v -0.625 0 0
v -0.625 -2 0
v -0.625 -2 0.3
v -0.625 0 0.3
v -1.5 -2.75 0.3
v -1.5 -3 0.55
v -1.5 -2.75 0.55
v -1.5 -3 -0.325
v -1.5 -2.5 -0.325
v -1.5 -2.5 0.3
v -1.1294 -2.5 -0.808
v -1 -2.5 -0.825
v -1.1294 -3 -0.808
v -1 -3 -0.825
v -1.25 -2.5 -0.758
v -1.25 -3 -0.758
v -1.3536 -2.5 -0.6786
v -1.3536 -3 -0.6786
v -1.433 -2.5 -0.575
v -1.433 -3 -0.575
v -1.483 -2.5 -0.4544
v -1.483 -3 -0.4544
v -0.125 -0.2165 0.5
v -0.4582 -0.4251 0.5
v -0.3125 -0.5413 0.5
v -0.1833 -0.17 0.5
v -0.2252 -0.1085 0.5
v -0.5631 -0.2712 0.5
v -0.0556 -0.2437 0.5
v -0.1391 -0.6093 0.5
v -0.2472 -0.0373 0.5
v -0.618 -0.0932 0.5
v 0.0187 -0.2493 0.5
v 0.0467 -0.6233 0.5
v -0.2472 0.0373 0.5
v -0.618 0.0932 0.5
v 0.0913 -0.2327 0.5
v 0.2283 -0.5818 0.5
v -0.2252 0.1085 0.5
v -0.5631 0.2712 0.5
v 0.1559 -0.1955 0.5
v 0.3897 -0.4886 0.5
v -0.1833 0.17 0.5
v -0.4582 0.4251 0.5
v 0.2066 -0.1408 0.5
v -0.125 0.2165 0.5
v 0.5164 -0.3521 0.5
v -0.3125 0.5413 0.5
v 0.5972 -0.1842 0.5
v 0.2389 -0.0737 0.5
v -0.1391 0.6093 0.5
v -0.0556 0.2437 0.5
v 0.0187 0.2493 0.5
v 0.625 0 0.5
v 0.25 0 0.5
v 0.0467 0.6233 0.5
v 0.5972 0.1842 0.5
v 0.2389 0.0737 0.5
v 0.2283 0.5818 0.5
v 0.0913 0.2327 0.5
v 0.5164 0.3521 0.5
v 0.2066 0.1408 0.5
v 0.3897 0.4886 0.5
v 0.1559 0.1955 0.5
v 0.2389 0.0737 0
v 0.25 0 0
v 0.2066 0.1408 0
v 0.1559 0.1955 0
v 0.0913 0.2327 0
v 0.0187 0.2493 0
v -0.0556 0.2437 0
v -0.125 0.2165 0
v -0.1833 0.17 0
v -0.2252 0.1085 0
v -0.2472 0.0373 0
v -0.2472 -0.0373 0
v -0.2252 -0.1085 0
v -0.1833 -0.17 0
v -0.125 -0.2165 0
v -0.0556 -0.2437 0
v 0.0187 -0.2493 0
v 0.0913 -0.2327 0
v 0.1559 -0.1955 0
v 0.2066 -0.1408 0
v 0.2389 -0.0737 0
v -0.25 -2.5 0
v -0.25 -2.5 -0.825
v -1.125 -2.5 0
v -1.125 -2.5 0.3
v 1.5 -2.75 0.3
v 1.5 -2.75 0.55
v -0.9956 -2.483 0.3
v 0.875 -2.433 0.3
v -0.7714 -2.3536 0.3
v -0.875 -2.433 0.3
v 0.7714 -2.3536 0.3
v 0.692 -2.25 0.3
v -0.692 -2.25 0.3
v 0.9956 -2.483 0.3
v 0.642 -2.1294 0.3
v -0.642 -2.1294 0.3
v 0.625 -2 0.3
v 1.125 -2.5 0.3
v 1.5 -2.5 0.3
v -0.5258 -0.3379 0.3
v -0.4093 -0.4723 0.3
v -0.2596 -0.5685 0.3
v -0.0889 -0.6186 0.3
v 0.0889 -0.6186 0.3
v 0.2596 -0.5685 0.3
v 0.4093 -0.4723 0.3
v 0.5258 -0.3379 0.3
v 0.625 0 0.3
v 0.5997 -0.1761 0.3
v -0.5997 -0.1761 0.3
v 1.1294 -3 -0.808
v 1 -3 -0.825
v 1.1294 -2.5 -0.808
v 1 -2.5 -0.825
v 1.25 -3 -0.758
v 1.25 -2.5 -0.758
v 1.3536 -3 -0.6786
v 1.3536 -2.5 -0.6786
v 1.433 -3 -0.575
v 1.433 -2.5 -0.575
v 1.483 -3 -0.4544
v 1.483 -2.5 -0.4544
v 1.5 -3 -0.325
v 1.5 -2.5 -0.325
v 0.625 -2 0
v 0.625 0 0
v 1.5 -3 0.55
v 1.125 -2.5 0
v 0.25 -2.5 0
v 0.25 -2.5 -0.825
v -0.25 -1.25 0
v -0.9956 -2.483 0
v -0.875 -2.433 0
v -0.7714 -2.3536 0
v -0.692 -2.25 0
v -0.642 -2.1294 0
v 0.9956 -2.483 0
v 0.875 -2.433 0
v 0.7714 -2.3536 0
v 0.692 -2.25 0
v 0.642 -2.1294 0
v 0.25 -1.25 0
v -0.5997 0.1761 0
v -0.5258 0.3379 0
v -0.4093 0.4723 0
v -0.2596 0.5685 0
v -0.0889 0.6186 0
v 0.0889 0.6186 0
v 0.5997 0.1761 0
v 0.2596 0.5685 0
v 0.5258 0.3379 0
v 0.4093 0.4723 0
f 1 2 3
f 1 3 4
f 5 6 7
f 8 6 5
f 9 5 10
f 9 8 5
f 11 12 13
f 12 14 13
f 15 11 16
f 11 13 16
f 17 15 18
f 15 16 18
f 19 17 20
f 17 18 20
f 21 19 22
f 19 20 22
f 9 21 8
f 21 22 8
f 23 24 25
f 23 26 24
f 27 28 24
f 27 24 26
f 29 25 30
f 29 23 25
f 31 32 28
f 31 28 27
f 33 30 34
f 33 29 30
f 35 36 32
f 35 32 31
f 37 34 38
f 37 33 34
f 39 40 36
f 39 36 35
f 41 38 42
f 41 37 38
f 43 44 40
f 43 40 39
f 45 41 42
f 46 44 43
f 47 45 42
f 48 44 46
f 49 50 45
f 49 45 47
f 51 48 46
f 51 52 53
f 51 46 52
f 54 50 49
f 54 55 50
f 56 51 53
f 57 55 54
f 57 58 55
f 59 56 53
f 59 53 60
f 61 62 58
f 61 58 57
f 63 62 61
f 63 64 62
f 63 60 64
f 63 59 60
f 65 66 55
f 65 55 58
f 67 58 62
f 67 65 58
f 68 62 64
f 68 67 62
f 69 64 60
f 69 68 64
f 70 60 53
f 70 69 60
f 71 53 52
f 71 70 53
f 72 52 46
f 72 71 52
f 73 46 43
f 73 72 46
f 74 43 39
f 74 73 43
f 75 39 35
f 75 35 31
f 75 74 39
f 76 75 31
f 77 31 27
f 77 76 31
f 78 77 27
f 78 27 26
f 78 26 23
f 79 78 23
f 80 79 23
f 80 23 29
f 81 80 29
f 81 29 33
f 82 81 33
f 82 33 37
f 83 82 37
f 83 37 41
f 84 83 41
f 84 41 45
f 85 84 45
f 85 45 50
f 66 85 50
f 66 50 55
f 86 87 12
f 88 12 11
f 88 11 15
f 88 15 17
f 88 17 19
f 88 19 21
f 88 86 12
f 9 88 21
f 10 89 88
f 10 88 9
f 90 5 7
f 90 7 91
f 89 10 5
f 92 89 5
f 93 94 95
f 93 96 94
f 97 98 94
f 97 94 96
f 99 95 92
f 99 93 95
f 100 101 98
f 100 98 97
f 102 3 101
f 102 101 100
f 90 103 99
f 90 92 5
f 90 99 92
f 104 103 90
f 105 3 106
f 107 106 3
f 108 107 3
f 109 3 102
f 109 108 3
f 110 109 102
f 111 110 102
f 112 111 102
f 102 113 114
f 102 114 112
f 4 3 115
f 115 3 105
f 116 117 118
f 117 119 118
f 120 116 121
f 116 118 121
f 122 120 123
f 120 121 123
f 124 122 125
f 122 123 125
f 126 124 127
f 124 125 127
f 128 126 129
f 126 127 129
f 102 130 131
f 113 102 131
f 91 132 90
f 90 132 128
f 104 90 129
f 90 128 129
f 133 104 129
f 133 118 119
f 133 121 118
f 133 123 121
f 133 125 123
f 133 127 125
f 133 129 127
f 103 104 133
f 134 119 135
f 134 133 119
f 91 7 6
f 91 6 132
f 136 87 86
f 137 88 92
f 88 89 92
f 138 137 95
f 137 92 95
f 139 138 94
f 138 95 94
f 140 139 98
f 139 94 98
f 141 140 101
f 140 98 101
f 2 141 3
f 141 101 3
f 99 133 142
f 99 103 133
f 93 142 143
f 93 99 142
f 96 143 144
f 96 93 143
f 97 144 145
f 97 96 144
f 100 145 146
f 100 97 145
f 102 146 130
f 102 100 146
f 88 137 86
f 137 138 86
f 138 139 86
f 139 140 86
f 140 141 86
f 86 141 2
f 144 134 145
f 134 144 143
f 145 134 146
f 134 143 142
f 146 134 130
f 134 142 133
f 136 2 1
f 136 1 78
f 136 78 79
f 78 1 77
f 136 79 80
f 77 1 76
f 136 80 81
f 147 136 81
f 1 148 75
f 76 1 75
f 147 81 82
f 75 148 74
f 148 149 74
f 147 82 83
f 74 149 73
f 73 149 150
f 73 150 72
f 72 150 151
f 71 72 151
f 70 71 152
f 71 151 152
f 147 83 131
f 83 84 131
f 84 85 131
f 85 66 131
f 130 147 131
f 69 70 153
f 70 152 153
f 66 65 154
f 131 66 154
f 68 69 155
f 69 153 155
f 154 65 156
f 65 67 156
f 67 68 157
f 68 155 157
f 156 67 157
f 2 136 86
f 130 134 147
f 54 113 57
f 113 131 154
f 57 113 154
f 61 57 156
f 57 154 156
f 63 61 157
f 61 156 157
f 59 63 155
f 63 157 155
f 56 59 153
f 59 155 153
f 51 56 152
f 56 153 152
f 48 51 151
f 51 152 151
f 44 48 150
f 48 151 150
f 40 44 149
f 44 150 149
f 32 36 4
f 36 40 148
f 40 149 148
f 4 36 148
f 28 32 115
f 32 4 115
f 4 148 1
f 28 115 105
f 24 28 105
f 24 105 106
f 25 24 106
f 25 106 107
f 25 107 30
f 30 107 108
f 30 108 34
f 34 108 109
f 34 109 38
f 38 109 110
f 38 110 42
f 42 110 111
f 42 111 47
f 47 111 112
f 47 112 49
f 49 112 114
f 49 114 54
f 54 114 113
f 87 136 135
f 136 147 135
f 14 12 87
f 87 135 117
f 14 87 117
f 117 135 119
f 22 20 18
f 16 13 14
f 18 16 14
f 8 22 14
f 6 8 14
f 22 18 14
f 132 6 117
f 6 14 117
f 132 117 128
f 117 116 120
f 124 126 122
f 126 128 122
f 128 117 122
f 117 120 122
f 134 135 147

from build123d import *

# Parameters (mm, degrees)
SKETCH1_R           = 0.625
SKETCH1_R_2         = 0.25
BOSS_EXTRUDE1_DEPTH = 0.5
SKETCH2_W           = 1.25
SKETCH2_H           = 2.5
BOSS_EXTRUDE2_DEPTH = 0.3
BOSS_EXTRUDE3_DEPTH = 1.125
SKETCH4_W           = 3
SKETCH4_H           = 0.25
BOSS_EXTRUDE4_DEPTH = 0.25
SKETCH6_R           = 0.25
CUT_EXTRUDE1_DEPTH  = 0.3
FILLET1_R           = 0.5
BOSS_EXTRUDE5_DEPTH = 0.25
FILLET2_R           = 0.5


with BuildPart() as part:
    # Sketch1 → Boss-Extrude1 (new body)
    with BuildSketch(Plane.XY):
        Circle(SKETCH1_R)
        Circle(SKETCH1_R_2, mode=Mode.SUBTRACT)
    extrude(amount=BOSS_EXTRUDE1_DEPTH)

    # Sketch2 → Boss-Extrude2 (add)
    with BuildSketch(Plane.XY):
        with Locations((0, -1.25)):
            Rectangle(SKETCH2_W, SKETCH2_H)
    extrude(amount=BOSS_EXTRUDE2_DEPTH)

    # Sketch3 → Boss-Extrude3 (add)
    with BuildSketch(Plane.XY.offset(0.3)):
        Polygon((0, -2.5), (-0.625, -2.5), (-1.5, -2.5), (-1.5, -3), (1.5, -3), (1.5, -2.5), (0.625, -2.5), align=None)
    extrude(amount=-BOSS_EXTRUDE3_DEPTH)

    # Sketch4 → Boss-Extrude4 (add)
    with BuildSketch(Plane.XY.offset(0.3)):
        with Locations((0, -2.875)):
            Rectangle(SKETCH4_W, SKETCH4_H)
    extrude(amount=BOSS_EXTRUDE4_DEPTH)

    # Sketch6 → Cut-Extrude1 (cut)
    with BuildSketch(Plane.XY.offset(0.3)):
        Circle(SKETCH6_R)
    extrude(amount=-CUT_EXTRUDE1_DEPTH, mode=Mode.SUBTRACT)

    # Fillet1
    fillet1_edges = [part.edges().sort_by_distance(p)[0] for p in [
        (-0.625, -2.5, 0.15),
        (0.625, -2.5, 0.15),
    ]]
    fillet(fillet1_edges, radius=FILLET1_R)

    # Sketch7 → Boss-Extrude5 (add, symmetric)
    with BuildSketch(Plane(origin=(0, 0, 0), x_dir=(0, 0, -1), z_dir=(1, 0, 0))):
        Polygon((0, -2.5), (0, -1.25), (0.825, -2.5), align=None)
    extrude(amount=BOSS_EXTRUDE5_DEPTH, both=True)

    # Fillet2
    fillet2_edges = [part.edges().sort_by_distance(p)[0] for p in [
        (1.5, -2.75, -0.825),
        (-1.5, -2.75, -0.825),
    ]]
    fillet(fillet2_edges, radius=FILLET2_R)


solid = part.part
